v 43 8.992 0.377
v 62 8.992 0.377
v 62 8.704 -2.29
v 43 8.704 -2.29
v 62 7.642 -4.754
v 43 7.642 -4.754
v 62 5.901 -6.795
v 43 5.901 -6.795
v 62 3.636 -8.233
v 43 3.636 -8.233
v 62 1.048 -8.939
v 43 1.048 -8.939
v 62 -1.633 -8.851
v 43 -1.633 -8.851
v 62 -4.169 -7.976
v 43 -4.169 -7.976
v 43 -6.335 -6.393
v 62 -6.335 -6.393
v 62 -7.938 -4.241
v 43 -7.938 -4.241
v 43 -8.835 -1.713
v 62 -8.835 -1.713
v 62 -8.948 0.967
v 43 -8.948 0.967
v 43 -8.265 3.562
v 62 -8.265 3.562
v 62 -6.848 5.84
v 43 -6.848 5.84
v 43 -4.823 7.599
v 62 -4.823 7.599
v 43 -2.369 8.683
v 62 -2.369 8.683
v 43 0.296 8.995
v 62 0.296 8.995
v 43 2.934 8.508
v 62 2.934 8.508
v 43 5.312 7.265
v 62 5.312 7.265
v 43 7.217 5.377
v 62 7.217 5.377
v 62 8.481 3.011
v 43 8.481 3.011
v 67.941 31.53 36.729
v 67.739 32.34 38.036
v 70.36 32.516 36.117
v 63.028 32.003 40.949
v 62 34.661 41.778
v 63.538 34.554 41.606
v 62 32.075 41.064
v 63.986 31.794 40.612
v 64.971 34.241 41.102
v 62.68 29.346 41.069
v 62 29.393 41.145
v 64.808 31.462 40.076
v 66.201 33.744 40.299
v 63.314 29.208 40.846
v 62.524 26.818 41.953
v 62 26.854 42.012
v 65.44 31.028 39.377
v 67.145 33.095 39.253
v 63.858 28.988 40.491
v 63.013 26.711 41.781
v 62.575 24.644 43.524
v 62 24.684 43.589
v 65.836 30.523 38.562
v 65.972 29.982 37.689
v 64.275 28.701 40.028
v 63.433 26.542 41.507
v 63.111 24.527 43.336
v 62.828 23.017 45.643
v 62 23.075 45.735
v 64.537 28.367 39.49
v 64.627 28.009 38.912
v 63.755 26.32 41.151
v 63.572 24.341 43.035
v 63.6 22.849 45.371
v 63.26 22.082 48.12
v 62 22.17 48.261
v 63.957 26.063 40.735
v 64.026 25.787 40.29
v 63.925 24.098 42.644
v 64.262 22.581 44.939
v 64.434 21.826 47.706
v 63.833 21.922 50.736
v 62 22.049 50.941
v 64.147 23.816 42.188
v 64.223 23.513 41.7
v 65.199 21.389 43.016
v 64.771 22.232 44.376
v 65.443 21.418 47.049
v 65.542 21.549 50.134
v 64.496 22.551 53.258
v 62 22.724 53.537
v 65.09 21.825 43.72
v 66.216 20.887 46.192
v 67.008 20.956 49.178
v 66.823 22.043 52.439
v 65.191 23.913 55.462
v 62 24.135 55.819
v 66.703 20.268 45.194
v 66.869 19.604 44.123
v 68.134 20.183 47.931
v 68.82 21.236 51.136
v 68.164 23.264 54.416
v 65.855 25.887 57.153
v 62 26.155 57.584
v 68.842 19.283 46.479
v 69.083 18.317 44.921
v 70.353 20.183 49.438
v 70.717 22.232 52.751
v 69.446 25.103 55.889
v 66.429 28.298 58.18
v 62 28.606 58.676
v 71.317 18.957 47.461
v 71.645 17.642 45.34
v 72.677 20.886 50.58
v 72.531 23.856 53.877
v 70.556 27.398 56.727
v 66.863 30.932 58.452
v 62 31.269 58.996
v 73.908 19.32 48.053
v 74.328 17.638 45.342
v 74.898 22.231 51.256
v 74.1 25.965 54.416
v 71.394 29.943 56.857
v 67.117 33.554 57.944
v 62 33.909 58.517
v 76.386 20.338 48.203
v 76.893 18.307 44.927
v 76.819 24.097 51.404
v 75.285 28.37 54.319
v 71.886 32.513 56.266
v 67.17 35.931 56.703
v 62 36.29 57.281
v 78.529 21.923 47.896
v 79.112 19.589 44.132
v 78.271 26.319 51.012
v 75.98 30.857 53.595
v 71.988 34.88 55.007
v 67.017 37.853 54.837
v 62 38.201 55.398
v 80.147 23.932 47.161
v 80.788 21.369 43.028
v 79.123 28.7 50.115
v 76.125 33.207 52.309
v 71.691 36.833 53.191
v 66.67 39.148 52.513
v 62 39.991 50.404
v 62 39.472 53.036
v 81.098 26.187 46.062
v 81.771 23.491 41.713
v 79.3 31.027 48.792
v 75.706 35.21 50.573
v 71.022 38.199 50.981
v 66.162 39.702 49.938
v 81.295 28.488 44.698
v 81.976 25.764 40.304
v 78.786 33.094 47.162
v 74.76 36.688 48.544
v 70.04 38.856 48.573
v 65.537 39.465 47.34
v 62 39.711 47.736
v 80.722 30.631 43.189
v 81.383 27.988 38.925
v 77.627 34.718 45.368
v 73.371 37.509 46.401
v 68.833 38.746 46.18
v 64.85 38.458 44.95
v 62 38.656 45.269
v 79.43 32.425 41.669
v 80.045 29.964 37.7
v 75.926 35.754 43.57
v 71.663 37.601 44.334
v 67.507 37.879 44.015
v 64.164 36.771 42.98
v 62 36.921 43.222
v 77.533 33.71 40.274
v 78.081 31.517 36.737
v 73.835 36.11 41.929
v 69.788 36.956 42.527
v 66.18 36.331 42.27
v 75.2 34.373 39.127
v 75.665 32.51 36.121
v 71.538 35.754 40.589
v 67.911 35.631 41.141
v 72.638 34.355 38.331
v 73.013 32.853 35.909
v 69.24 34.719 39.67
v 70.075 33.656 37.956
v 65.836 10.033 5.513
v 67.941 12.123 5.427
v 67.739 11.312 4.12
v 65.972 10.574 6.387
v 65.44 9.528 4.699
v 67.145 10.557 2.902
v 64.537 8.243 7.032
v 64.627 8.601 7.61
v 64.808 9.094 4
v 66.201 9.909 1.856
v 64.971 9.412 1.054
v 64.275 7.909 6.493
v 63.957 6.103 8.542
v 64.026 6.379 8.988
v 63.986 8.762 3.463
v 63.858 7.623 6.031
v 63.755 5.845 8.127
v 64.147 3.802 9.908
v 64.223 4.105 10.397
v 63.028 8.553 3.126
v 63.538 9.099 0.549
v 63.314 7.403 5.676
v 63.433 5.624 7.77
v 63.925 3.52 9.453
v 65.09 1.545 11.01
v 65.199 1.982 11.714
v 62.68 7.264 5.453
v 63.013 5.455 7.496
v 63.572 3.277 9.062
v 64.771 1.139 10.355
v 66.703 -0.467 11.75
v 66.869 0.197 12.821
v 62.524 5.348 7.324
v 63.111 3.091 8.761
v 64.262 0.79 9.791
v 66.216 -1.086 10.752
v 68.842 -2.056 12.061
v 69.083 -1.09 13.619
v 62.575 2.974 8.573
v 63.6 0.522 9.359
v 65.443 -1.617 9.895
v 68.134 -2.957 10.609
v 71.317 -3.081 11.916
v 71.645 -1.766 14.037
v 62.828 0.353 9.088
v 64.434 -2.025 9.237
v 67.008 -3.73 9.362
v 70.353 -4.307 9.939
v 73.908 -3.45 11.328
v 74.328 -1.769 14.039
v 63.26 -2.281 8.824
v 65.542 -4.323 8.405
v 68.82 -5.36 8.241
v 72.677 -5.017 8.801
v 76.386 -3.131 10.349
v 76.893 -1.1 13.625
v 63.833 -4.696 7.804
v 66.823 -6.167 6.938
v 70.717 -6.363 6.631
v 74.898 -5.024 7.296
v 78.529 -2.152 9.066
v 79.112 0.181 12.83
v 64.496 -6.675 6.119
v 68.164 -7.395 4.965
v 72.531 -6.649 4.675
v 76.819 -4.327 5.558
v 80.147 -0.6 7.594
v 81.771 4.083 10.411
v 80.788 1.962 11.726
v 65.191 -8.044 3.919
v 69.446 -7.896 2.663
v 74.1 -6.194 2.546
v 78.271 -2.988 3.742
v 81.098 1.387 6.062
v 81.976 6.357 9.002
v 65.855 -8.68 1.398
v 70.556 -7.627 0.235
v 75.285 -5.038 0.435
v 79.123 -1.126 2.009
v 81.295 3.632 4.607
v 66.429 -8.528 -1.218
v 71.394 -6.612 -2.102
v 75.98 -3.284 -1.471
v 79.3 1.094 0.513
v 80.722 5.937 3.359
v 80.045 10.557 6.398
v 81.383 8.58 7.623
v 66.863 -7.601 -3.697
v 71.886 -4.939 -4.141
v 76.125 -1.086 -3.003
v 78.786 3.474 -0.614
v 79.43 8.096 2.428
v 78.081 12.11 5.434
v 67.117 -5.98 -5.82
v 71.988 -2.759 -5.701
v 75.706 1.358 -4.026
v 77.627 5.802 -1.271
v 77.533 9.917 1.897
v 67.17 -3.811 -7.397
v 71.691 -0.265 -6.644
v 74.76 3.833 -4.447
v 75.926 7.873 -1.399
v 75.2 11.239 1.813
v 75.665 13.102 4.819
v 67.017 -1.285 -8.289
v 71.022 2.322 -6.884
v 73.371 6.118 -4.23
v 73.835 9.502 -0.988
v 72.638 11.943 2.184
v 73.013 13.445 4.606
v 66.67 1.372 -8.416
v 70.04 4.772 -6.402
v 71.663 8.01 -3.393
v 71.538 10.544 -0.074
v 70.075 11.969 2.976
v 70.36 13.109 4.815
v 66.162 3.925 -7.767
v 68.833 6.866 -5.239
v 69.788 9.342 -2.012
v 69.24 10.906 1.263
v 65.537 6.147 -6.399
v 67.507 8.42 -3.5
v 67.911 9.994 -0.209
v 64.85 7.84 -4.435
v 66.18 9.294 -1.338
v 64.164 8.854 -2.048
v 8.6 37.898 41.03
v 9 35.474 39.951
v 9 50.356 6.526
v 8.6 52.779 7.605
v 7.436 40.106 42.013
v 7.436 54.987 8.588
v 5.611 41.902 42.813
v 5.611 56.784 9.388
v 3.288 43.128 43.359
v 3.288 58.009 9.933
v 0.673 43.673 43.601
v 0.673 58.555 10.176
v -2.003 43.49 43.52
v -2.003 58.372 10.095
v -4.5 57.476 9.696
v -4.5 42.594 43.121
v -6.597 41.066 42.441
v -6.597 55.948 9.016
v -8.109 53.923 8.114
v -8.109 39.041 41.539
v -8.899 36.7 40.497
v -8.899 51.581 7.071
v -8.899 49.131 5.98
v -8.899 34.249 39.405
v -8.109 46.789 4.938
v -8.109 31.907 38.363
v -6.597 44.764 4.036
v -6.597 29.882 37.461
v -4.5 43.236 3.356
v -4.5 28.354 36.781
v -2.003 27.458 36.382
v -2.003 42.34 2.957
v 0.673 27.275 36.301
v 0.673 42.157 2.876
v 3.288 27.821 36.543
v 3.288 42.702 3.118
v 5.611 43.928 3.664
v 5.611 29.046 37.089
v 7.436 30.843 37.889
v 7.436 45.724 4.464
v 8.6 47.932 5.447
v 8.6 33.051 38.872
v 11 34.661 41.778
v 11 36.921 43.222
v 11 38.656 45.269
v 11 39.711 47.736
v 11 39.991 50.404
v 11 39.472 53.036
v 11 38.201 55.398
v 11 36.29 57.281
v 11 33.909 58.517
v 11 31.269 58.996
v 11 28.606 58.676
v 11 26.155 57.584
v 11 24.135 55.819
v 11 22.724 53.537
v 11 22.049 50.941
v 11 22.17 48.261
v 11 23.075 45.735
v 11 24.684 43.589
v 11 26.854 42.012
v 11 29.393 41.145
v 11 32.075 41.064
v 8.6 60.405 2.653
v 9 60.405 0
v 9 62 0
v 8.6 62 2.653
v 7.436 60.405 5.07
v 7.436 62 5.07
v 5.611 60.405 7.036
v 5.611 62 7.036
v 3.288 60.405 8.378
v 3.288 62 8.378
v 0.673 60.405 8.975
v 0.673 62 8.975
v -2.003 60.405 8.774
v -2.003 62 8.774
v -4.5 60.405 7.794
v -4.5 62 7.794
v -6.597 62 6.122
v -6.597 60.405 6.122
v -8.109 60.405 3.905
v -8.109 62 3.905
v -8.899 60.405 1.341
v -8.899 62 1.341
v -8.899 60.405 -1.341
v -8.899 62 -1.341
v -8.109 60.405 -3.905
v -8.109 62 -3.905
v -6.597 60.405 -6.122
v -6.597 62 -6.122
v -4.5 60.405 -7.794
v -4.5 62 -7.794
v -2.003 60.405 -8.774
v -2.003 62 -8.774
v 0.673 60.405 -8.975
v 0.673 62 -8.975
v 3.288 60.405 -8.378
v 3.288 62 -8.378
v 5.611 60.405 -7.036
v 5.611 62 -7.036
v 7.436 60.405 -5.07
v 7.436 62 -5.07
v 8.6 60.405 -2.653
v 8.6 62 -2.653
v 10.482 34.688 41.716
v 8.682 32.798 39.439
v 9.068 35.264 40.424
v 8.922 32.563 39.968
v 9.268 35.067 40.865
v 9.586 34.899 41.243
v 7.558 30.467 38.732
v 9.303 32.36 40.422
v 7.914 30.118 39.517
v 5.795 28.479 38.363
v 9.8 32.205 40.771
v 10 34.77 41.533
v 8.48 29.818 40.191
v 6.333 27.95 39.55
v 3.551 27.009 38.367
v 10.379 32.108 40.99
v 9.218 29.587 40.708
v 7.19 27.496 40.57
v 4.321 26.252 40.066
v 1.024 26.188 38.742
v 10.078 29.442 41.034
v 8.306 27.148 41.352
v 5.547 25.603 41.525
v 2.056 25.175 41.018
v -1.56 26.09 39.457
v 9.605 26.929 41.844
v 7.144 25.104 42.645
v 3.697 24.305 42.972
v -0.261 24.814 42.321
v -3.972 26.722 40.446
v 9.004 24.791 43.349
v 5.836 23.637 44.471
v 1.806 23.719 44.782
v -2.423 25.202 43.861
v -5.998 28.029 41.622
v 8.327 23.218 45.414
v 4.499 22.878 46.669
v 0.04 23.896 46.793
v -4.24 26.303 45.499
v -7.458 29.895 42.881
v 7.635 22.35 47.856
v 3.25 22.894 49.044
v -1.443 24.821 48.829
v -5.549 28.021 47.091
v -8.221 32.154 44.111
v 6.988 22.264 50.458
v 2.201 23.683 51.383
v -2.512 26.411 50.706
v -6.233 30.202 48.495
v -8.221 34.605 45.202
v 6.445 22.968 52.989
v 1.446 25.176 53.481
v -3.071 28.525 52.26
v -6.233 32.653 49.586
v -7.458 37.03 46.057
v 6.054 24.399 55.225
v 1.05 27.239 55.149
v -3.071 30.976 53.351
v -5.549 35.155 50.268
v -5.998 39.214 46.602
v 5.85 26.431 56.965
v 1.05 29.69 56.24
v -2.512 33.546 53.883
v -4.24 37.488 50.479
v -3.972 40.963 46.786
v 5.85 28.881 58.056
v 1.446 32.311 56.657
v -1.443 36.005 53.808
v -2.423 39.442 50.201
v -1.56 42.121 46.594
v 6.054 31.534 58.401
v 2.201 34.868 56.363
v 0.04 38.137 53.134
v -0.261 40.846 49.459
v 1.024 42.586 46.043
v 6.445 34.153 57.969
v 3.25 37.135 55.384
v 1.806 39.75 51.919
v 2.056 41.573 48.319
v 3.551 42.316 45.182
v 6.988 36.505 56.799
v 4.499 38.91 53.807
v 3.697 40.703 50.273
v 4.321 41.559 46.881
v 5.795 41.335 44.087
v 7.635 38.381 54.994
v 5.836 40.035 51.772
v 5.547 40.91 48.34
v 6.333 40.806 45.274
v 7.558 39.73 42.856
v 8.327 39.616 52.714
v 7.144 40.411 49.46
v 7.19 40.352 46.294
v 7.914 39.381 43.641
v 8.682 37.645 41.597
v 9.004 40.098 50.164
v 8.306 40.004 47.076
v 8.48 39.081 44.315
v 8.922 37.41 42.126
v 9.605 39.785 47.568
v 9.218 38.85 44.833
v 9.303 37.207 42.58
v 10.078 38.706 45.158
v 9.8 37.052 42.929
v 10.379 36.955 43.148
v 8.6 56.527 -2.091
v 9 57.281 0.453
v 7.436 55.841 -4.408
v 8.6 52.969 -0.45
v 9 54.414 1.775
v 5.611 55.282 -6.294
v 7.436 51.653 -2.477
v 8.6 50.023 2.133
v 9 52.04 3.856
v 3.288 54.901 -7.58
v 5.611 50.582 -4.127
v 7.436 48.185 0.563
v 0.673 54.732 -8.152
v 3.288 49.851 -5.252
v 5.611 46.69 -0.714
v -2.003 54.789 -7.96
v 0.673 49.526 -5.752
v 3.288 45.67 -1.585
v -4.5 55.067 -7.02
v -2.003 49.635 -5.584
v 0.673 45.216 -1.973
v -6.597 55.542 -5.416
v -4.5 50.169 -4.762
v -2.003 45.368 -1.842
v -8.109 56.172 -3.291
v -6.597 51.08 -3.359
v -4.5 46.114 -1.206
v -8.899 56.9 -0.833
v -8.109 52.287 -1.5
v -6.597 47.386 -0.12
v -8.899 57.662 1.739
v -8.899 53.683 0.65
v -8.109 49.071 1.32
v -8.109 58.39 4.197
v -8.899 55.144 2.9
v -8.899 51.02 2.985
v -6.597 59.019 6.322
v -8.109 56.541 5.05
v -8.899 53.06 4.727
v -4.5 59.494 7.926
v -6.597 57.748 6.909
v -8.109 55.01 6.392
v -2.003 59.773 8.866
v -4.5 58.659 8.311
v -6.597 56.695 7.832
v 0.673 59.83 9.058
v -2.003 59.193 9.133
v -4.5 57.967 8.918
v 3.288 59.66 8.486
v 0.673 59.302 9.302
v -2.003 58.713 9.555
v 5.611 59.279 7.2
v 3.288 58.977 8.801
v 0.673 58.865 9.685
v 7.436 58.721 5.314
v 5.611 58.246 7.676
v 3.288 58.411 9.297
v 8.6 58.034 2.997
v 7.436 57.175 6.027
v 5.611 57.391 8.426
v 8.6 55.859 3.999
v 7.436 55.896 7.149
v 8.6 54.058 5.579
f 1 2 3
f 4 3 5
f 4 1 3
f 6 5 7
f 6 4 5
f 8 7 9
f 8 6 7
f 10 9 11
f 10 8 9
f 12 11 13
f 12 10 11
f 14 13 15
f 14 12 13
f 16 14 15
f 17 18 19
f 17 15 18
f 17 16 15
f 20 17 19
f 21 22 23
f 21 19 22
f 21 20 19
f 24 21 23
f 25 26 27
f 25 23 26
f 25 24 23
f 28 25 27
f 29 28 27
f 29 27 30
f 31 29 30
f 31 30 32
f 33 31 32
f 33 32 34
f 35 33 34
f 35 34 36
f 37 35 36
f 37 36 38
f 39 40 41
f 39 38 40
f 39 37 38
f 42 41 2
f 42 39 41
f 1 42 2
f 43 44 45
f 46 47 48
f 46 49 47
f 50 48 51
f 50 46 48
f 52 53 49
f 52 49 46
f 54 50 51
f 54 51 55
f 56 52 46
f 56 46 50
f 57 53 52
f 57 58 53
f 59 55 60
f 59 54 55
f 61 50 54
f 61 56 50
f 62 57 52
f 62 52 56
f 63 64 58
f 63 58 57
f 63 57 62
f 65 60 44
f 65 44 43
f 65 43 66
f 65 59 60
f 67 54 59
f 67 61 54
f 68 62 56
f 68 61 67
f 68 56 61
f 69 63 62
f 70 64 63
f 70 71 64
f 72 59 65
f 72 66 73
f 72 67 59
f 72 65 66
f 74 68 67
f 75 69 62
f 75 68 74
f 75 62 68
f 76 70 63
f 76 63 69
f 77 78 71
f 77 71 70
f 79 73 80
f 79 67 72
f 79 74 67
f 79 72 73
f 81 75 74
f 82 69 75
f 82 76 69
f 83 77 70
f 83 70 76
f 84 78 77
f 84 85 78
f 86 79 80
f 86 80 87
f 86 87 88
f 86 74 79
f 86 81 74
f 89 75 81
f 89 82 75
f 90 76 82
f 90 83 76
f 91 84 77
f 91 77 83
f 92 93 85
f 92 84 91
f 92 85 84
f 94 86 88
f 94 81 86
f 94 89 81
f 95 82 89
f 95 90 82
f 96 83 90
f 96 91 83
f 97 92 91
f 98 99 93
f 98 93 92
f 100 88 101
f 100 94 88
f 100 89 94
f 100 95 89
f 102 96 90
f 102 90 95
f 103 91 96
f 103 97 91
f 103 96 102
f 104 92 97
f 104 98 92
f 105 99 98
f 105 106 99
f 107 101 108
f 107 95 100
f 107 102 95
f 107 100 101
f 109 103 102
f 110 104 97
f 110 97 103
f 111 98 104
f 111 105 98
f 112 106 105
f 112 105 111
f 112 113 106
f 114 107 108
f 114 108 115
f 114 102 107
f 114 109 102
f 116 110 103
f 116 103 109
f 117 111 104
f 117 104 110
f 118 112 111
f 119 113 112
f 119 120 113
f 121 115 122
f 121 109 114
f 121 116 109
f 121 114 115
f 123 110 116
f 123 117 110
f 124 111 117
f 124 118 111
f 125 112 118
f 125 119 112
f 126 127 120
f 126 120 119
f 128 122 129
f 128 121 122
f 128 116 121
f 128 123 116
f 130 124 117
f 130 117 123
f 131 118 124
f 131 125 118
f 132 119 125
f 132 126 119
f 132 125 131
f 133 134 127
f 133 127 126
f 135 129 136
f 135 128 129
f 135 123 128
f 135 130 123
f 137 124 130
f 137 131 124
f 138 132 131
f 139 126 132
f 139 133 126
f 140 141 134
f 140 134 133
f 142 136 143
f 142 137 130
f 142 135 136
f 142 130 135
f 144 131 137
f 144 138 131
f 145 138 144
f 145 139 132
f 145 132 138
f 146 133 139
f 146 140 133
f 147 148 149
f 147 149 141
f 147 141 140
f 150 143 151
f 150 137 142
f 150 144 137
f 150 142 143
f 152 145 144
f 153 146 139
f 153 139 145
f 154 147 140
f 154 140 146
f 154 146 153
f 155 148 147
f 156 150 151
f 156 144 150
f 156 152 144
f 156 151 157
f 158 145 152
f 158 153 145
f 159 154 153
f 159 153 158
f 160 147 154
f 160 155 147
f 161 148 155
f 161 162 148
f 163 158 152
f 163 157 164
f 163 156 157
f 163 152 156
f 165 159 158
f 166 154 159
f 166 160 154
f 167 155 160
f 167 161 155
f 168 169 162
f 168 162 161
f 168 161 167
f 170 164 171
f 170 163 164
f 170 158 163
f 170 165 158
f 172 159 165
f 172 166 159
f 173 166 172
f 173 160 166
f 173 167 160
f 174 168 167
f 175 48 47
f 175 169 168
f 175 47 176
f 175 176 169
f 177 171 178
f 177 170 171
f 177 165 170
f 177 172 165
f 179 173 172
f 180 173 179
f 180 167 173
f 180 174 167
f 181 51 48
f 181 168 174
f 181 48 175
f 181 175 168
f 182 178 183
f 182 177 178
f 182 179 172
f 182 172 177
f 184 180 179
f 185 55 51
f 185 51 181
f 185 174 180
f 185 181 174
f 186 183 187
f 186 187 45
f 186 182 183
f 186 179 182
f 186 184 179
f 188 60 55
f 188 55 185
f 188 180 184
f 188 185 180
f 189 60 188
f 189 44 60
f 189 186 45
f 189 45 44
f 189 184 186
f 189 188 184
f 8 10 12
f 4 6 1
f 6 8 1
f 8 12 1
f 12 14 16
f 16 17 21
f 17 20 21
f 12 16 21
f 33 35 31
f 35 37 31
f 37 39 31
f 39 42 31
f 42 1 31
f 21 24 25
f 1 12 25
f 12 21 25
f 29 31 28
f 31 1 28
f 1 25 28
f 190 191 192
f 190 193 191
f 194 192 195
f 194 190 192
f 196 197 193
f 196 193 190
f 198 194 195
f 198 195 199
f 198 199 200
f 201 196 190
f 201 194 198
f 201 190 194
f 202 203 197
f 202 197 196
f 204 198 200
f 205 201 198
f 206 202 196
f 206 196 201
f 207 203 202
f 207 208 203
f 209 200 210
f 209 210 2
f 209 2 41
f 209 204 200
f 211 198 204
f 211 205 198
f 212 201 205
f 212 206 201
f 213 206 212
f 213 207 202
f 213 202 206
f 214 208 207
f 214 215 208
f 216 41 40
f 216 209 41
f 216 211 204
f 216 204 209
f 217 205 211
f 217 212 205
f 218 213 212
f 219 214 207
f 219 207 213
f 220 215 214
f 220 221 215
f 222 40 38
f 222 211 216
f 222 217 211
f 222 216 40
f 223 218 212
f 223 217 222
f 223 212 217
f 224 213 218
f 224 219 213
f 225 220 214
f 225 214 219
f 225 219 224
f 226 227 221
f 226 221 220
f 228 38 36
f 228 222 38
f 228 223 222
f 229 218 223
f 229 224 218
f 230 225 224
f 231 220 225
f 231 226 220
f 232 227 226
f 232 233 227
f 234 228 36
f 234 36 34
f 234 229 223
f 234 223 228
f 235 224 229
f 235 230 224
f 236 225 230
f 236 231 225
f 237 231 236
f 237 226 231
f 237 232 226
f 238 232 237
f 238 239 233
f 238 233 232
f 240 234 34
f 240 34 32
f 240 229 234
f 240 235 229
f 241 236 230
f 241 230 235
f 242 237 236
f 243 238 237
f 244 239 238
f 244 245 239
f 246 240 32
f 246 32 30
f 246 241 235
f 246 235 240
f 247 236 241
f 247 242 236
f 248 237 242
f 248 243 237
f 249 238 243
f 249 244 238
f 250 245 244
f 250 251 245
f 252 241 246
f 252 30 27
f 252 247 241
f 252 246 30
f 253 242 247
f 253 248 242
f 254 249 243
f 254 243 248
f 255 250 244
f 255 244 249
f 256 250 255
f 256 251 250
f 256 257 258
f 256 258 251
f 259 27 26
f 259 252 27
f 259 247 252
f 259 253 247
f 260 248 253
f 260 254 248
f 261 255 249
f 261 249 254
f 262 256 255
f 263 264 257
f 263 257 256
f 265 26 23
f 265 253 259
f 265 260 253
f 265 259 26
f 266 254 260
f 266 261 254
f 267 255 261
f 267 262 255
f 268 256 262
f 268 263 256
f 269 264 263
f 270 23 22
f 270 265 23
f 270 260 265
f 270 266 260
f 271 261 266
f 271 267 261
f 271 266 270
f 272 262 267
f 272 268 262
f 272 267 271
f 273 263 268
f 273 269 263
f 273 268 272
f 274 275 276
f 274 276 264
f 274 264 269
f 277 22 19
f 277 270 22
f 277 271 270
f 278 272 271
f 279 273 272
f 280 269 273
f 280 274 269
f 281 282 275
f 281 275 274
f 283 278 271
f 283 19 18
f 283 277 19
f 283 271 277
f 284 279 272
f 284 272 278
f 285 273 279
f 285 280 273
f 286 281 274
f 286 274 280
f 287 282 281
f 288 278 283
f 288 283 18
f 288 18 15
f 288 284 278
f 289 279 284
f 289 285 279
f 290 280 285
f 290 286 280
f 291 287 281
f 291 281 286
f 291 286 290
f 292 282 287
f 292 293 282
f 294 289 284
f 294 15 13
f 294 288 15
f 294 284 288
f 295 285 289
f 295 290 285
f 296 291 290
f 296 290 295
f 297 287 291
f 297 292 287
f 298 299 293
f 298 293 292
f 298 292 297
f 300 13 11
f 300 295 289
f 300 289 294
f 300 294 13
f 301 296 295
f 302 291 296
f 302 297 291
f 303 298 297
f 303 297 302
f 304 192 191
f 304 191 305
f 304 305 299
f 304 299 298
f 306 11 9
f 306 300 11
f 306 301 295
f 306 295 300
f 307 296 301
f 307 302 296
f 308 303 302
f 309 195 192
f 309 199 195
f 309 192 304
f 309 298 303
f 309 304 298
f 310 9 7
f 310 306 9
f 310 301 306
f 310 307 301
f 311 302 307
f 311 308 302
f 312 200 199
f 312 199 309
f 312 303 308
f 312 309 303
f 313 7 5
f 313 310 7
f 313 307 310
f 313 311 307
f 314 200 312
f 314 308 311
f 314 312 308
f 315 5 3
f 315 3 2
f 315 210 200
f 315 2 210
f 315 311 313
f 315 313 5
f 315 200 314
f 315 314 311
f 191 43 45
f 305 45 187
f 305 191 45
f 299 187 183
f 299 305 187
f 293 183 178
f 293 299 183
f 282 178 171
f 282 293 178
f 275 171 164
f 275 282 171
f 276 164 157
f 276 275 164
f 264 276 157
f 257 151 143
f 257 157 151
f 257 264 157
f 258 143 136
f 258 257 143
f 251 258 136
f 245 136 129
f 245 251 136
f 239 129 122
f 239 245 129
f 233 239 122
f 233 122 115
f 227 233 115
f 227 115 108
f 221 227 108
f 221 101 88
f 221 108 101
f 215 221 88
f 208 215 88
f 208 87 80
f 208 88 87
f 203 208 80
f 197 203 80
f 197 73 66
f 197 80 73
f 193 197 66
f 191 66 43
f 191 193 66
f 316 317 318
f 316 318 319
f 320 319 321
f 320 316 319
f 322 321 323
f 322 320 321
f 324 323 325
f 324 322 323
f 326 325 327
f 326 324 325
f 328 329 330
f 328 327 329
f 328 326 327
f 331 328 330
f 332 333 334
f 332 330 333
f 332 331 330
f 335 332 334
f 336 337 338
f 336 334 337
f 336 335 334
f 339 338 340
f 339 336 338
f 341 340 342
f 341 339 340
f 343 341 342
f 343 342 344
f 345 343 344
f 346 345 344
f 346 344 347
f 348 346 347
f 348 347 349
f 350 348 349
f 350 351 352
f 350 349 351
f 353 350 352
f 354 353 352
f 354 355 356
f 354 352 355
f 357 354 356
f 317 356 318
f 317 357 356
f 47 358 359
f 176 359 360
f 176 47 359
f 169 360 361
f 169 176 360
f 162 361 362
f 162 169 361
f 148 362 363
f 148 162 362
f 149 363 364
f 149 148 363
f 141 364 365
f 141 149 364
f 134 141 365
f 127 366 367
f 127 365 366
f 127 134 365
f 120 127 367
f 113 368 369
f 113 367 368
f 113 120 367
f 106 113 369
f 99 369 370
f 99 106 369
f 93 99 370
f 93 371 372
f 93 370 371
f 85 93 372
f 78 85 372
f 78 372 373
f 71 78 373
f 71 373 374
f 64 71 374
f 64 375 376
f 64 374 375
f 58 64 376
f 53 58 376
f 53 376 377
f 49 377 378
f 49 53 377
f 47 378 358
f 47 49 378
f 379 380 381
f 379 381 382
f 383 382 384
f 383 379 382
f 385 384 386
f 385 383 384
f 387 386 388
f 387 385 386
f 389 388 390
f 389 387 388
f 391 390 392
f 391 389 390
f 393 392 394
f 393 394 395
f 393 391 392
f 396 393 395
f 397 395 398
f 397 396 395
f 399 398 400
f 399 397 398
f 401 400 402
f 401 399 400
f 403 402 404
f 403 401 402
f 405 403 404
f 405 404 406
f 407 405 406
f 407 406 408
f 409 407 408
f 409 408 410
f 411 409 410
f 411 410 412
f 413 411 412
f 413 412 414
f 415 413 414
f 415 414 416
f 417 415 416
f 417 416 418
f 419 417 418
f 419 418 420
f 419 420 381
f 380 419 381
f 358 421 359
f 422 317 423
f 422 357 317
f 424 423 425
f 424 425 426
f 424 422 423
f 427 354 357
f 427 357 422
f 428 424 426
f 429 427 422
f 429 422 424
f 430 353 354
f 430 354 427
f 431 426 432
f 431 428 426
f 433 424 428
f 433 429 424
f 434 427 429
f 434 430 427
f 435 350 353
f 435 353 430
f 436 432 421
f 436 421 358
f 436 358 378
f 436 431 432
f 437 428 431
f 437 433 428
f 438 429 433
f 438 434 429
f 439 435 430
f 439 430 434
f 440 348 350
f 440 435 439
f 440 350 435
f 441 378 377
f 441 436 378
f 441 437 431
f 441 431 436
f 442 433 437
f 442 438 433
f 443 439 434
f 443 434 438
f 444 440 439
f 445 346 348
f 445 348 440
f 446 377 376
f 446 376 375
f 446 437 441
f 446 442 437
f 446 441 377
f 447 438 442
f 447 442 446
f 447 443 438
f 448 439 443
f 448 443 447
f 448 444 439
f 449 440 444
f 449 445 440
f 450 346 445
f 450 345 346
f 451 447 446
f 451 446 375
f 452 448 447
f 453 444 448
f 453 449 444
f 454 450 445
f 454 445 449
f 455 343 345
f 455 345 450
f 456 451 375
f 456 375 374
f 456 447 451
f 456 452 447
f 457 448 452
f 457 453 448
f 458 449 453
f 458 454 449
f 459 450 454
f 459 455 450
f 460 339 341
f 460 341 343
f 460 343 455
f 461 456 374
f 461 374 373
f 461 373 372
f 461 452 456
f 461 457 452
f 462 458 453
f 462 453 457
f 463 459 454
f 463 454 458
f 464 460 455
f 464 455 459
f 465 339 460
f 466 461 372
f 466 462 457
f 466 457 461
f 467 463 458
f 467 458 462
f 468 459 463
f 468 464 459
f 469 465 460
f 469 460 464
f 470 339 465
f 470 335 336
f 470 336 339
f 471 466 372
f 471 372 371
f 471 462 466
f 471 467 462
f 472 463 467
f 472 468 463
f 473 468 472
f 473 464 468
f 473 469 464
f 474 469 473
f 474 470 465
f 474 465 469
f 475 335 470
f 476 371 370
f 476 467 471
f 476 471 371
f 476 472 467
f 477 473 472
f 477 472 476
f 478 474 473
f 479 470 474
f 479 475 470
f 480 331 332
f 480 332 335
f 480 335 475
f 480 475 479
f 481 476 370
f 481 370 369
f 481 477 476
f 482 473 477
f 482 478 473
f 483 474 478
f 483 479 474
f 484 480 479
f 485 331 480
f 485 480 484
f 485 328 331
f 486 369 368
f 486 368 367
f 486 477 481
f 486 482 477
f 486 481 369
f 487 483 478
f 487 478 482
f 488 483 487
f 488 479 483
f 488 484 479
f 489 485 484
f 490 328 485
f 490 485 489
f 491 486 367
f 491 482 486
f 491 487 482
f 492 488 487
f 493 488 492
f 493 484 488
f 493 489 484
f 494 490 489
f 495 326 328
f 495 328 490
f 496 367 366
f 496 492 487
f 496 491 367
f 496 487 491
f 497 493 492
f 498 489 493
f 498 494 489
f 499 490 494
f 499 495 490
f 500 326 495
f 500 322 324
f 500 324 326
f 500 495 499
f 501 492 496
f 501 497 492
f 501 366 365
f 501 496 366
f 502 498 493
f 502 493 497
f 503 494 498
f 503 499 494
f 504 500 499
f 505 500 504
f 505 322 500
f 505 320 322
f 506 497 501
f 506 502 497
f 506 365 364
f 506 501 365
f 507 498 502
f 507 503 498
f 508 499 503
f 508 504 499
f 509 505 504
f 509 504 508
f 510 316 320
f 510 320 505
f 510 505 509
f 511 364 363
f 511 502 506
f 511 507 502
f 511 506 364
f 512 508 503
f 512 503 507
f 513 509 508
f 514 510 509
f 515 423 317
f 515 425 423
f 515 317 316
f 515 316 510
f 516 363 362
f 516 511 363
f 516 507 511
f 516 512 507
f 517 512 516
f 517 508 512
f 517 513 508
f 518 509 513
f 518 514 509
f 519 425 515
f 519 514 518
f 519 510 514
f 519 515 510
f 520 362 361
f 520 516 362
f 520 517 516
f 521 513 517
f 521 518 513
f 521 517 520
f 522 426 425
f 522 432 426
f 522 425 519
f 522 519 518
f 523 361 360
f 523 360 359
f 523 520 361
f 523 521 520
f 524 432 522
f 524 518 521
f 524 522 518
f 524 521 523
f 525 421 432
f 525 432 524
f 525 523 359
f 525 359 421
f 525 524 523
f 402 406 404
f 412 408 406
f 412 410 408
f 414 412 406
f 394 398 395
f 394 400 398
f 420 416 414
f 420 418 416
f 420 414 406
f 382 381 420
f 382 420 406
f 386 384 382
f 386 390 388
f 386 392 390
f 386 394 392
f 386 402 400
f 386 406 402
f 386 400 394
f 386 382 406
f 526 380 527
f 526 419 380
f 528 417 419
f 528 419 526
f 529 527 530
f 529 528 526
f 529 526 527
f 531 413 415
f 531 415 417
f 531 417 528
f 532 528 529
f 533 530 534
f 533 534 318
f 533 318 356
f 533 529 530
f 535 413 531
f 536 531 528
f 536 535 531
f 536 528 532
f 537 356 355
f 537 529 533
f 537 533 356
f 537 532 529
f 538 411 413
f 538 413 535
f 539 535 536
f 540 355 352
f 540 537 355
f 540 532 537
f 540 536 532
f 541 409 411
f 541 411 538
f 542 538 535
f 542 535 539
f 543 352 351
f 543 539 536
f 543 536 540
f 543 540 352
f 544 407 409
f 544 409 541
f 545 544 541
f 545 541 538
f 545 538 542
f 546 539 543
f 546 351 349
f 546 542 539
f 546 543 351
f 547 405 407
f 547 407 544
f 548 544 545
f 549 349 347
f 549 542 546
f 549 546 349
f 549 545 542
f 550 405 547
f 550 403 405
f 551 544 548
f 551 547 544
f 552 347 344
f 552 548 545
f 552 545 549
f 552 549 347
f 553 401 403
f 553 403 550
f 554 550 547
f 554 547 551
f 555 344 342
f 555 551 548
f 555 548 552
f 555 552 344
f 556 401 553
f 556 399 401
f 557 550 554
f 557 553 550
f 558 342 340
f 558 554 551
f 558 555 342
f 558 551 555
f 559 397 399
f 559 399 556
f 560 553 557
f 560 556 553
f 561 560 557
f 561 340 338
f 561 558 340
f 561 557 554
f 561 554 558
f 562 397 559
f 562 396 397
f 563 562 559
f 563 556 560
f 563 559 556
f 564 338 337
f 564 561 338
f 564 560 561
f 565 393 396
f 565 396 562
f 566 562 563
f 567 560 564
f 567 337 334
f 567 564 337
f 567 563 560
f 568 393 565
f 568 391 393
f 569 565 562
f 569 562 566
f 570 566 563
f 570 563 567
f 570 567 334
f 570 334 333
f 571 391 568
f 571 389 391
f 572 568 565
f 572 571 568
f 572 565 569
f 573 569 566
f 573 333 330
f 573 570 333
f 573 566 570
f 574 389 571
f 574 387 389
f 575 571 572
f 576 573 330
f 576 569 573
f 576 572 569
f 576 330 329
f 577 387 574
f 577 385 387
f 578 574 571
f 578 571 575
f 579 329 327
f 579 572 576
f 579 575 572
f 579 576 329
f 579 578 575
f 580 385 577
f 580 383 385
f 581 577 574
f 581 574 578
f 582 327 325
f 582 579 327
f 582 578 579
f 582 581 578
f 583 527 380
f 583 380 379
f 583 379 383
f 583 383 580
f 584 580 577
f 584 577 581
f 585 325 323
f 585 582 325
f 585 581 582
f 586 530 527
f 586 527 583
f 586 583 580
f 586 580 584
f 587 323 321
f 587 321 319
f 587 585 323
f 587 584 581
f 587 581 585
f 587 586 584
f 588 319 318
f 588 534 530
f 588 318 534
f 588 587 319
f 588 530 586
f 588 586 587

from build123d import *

# Parameters (mm, degrees)
SKETCH_8_R = 9


with BuildPart() as part:
    # 扫描5: sweep along a curve in space
    with BuildLine() as sweep_5_path:
        Line((0, 62, 0), (0, 60.404917791, 0))
        ThreePointArc((0, 60.404917791, 0), (0, 54.413888405, 1.774623753), (0, 50.355917757, 6.525896926))
        Line((0, 50.355917757, 6.525896926), (0, 35.474103074, 39.950999966))
        ThreePointArc((0, 35.474103074, 39.950999966), (3.221825407, 32.310434451, 47.056716034), (11, 31, 50))
        Line((11, 31, 50), (62, 31, 50))
        ThreePointArc((62, 31, 50), (69.778174593, 29.302292387, 47.261761914), (73, 25.203663643, 40.651070391))
        Line((73, 25.203663643, 40.651070391), (73, 5.796336357, 9.348929609))
        ThreePointArc((73, 5.796336357, 9.348929609), (69.778174593, 1.697707613, 2.738238086), (62, 0, 0))
        Line((62, 0, 0), (43, 0, 0))
    # 草图8 → 扫描5 (sweep)
    with BuildSketch(Plane(origin=(0, 62, 0), x_dir=(1, 0, 0), z_dir=(0, 1, 0))):
        Circle(SKETCH_8_R)
    sweep(path=sweep_5_path.line)


solid = part.part
